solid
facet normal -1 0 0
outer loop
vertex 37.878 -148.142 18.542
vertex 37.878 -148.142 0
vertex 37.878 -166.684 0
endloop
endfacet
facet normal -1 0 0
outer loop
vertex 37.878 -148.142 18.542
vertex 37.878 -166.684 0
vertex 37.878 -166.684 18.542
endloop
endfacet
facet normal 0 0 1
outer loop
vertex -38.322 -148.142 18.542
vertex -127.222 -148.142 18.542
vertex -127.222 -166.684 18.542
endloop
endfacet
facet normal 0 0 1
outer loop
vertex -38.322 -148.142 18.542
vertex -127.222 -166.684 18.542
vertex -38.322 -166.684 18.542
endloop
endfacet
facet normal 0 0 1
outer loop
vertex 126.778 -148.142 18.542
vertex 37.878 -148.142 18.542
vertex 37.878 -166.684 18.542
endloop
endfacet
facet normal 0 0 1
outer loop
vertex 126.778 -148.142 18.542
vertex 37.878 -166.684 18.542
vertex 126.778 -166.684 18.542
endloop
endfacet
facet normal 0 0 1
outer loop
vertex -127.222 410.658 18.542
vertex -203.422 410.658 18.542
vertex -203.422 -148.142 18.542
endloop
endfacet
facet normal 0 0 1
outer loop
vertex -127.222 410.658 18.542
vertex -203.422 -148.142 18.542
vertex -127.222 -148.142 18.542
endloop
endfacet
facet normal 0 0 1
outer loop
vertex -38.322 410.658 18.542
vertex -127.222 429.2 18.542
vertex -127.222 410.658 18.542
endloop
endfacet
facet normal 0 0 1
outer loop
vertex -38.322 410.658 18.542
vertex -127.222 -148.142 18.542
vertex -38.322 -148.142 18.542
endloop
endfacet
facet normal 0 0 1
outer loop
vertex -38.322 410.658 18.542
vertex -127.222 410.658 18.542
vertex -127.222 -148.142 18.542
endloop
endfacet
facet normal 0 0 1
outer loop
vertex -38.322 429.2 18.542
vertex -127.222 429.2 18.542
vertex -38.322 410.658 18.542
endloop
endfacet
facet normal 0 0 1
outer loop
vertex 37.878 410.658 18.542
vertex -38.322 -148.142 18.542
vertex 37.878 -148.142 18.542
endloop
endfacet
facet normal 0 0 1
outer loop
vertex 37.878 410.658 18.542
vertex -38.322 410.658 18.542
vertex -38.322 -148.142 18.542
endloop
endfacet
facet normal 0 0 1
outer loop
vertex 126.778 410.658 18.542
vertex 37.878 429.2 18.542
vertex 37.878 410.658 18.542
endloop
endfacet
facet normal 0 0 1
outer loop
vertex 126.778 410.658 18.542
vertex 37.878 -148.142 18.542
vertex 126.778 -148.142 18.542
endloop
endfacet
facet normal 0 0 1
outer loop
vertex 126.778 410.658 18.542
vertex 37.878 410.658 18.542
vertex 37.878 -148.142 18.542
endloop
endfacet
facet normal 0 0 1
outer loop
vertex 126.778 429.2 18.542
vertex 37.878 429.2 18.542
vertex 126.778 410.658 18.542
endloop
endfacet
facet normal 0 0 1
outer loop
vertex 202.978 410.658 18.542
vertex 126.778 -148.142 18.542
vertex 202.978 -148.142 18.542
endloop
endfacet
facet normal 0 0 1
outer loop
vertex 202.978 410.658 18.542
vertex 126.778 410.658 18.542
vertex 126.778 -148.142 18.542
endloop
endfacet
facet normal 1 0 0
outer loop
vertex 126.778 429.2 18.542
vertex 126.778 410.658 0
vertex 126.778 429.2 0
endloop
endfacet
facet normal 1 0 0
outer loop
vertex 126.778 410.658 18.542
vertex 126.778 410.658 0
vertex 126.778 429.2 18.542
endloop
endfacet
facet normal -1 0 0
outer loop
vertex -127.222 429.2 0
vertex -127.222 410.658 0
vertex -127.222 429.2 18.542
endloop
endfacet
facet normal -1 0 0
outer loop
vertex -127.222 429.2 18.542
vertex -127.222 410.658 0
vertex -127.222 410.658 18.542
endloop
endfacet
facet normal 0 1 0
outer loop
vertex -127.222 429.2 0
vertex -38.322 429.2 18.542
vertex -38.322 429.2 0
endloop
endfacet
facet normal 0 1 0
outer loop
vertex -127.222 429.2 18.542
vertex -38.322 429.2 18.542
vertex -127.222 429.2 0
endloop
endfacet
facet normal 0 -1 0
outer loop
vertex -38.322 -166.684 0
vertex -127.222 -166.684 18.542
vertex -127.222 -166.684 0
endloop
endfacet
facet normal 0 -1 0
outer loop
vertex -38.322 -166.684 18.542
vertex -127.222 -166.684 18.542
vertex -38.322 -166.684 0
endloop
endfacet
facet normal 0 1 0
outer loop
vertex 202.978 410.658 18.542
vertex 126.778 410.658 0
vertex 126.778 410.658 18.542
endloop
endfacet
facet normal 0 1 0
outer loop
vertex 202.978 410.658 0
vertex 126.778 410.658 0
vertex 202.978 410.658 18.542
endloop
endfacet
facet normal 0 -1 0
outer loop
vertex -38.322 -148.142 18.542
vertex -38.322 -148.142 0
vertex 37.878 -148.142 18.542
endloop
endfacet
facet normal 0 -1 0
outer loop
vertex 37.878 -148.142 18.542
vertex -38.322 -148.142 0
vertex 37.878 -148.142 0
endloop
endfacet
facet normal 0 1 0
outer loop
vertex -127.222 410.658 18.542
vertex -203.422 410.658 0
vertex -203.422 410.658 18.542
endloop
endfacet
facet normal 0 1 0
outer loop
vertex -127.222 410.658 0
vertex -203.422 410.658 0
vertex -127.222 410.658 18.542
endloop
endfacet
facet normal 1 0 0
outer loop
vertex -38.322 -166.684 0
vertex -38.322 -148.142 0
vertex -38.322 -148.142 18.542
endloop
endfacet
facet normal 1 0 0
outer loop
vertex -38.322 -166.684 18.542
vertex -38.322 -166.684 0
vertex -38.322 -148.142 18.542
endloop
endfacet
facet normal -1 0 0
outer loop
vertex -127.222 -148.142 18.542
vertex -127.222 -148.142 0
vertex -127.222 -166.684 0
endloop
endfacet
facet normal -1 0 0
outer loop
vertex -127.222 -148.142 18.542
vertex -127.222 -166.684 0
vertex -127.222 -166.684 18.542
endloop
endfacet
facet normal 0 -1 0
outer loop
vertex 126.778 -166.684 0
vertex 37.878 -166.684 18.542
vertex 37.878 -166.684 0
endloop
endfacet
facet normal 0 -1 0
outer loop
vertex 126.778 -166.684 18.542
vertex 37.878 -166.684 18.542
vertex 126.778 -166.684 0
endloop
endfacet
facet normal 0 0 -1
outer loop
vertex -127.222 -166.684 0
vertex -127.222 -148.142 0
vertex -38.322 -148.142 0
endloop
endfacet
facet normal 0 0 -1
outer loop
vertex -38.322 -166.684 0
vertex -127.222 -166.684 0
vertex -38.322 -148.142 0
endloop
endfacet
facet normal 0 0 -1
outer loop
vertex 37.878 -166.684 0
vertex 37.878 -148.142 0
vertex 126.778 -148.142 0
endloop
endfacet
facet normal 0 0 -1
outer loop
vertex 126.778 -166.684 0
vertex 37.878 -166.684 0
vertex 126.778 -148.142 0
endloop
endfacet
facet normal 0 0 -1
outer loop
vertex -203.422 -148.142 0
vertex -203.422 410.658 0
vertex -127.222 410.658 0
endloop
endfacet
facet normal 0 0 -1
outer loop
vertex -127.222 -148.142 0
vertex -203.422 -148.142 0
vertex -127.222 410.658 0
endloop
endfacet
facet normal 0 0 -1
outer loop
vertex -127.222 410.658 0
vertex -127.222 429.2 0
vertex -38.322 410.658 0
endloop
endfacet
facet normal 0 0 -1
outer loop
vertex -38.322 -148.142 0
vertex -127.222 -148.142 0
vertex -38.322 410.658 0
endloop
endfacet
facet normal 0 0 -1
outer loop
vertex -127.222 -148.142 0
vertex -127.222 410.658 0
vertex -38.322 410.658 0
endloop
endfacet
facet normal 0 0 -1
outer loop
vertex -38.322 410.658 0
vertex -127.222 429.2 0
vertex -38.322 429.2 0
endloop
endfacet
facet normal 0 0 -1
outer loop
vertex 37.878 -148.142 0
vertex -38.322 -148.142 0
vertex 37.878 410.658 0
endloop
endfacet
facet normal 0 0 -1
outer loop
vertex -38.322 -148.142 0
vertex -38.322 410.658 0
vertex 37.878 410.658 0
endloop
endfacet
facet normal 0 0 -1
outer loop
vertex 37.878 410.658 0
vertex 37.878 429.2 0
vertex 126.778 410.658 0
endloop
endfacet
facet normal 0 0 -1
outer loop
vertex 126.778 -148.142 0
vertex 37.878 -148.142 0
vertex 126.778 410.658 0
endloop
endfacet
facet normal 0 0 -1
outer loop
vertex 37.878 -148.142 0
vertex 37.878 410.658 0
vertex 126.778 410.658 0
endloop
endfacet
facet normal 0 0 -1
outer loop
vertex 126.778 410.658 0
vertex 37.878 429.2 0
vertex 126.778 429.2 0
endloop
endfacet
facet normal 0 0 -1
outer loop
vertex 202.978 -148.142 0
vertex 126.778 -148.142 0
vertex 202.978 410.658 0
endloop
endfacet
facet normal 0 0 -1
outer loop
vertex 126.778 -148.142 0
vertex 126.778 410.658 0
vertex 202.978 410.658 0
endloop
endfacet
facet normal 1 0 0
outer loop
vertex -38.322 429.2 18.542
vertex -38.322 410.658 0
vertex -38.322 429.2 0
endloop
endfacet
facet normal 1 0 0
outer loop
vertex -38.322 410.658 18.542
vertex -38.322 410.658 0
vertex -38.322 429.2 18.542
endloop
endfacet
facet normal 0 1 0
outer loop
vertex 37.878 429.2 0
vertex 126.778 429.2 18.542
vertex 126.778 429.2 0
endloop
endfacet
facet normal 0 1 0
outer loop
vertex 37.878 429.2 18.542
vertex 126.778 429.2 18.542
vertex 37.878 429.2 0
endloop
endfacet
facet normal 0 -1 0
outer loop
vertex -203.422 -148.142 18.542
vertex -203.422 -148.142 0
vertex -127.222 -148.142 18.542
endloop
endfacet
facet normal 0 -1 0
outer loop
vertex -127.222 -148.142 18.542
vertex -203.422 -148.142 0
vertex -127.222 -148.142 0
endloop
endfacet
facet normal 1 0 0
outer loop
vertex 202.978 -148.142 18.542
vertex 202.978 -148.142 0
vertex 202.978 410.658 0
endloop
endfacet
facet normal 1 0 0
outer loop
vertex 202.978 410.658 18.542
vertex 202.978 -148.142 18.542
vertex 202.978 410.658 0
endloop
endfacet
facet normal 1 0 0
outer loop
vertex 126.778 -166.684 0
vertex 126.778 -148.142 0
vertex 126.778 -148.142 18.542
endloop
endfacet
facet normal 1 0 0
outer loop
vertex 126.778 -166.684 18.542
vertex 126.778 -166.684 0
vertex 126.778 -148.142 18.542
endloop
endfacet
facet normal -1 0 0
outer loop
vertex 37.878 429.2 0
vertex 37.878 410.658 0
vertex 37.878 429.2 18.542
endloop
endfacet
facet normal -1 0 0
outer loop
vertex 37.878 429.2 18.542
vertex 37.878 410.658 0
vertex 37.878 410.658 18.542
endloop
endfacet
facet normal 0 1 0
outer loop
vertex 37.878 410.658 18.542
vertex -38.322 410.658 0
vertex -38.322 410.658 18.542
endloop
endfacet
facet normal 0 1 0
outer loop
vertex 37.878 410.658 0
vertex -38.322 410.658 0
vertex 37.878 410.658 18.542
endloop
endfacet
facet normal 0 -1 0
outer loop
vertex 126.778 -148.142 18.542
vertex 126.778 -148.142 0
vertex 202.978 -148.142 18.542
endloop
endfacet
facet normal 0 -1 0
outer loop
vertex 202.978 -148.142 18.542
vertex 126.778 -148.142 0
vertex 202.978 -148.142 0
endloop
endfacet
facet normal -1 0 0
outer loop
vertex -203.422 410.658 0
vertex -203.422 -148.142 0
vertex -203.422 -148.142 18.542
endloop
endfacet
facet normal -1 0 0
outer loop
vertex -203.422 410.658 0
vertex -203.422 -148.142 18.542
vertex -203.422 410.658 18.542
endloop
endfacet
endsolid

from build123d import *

# Parameters (mm, degrees)
F0_W     = 406.4
F0_H     = 558.8
F1_DEPTH = 18.542
F2_W     = 88.9
F2_H     = 18.542
F3_DEPTH = 18.542
F4_W     = 88.9
F4_H     = 18.542
F5_DEPTH = 18.542


with BuildPart() as f1:
    # F0 (on Top) → F1 (new body)
    with BuildSketch(Plane.XY):
        with Locations((-0.222251, 131.257872)):
            Rectangle(F0_W, F0_H)
    extrude(amount=F1_DEPTH)

    # F2 (on face) → F3 (join)
    with BuildSketch(Plane.XZ.offset(148.142128)):
        with Locations((-82.772251, 9.271)):
            Rectangle(F2_W, F2_H)
        with Locations((82.327749, 9.271)):
            Rectangle(F2_W, F2_H)
    extrude(amount=F3_DEPTH)

    # F4 (on face) → F5 (join)
    with BuildSketch(Plane(origin=(0, 410.657872, 0), x_dir=(-1, 0, 0), z_dir=(0, 1, 0))):
        with Locations((-82.327749, 9.271)):
            Rectangle(F4_W, F4_H)
        with Locations((82.772251, 9.271)):
            Rectangle(F4_W, F4_H)
    extrude(amount=F5_DEPTH)


solid = f1.part
